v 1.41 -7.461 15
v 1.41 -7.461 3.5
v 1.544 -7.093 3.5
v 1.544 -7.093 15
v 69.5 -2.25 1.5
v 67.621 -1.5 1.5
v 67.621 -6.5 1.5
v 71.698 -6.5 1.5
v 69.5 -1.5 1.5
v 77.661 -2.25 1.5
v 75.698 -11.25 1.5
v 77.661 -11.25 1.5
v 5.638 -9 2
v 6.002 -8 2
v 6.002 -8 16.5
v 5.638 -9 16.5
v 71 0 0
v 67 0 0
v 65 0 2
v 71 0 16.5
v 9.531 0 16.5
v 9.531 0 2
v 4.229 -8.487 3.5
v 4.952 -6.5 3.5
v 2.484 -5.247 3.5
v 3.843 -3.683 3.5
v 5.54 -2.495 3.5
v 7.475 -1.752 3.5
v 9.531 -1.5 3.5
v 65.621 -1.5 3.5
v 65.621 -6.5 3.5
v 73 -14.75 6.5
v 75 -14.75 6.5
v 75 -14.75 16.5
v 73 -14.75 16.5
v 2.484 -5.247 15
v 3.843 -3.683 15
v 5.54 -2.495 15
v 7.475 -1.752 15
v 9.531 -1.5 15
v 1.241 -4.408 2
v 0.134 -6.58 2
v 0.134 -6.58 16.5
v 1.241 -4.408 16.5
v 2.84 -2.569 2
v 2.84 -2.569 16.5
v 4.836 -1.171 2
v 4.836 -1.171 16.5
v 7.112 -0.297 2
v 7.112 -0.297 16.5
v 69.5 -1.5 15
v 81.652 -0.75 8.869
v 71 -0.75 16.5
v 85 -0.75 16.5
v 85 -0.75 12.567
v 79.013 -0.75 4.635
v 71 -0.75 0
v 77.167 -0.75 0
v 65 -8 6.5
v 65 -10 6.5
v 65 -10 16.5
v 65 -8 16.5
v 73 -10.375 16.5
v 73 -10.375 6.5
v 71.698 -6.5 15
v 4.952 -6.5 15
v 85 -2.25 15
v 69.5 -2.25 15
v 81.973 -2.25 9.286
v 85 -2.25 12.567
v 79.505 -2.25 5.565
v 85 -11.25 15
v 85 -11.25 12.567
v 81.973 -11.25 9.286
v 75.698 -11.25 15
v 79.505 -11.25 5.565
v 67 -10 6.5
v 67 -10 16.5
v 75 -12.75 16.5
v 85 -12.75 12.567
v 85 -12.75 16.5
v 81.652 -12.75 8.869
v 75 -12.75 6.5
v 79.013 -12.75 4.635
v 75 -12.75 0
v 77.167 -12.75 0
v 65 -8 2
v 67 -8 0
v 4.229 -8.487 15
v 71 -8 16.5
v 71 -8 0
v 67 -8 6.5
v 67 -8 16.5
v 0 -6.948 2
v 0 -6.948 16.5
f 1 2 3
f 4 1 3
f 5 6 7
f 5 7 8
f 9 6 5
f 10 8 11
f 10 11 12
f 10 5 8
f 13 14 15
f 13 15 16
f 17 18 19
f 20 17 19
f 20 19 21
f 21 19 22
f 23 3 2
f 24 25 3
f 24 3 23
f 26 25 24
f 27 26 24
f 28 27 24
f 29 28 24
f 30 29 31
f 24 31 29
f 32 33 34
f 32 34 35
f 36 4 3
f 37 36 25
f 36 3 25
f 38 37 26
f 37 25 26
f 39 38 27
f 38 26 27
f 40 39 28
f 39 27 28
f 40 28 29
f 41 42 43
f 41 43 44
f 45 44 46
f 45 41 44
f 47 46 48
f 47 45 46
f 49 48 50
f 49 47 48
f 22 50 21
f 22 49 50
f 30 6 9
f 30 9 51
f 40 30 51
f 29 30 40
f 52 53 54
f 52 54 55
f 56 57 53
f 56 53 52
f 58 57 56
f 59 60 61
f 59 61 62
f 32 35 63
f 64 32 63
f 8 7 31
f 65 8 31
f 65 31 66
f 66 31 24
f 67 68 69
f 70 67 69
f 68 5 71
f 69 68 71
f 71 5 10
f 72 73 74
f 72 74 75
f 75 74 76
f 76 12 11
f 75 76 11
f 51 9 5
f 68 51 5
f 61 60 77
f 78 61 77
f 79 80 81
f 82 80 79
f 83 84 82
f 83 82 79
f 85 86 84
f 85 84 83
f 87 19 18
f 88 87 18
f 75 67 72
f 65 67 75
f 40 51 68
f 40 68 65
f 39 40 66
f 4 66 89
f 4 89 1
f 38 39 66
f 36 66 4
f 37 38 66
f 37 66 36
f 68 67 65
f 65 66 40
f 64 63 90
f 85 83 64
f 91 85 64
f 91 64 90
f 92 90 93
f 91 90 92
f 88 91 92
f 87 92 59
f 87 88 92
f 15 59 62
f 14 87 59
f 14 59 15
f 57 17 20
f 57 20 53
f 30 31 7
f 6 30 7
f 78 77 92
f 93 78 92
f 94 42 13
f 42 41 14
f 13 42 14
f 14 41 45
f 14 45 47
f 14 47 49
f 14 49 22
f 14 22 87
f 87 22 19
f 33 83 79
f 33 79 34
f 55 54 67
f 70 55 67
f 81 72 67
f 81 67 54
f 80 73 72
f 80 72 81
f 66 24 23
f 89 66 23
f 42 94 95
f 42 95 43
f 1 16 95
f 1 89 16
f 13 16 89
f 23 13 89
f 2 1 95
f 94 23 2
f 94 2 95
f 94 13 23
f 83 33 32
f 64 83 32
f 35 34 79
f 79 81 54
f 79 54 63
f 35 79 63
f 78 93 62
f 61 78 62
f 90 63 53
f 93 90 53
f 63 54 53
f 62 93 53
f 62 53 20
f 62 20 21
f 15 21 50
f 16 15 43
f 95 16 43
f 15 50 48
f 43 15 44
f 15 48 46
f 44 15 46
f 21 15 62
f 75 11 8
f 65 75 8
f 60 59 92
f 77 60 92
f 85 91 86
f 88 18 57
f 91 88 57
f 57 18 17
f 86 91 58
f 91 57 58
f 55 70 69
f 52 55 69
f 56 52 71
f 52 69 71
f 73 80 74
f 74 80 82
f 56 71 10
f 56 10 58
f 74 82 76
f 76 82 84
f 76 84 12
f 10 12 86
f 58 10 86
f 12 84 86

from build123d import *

# Parameters (mm, degrees)
RESSALTO_EXTRUS_O1_DEPTH = 16.5
CORTE_EXTRUS_O1_START    = -14.5
ESBO_O2_W                = 84.883298415
ESBO_O2_H                = 23.037156827
CORTE_EXTRUS_O1_DEPTH    = 14.5
CHANFRO1_SIZE            = 3
CASCA1_T                 = -1.5
CORTE_EXTRUS_O2_DEPTH    = 88.520354775
ESBO_O5_W                = 2
ESBO_O5_H                = 2
RESSALTO_EXTRUS_O2_DEPTH = 10


with BuildPart() as part:
    # Esboço1 → Ressalto-extrusão1 (new body)
    with BuildSketch(Plane.XY):
        with BuildLine():
            Line((9.53089658, 0), (71, 0))
            Line((71, 0), (71, -0.75))
            Line((71, -0.75), (85, -0.75))
            Line((85, -0.75), (85, -12.75))
            Line((85, -12.75), (75, -12.75))
            Line((75, -12.75), (71, -8))
            Line((71, -8), (6.002125959, -8))
            Line((6.002125959, -8), (5.638155725, -9))
            Line((5.638155725, -9), (0, -6.94787914))
            Line((0, -6.94787914), (0.133970372, -6.579798567))
            ThreePointArc((0.133970372, -6.579798567), (3.795132217, -1.808479557), (9.53089658, 0))
        make_face()
    extrude(amount=RESSALTO_EXTRUS_O1_DEPTH)

    # Esboço2 → Corte-extrusão1 (cut)
    with BuildSketch(Plane.XY.offset(16.5).offset(CORTE_EXTRUS_O1_START)):
        with Locations((25.558350793, -2.469824016)):
            Rectangle(ESBO_O2_W, ESBO_O2_H)
    extrude(amount=-CORTE_EXTRUS_O1_DEPTH, mode=Mode.SUBTRACT)

    # Chanfro1
    # the kernel refuses this chamfer: 3 mm, written as the material it adds along each edge
    with BuildSketch(Plane(origin=(68, 0, 2), x_dir=(-0.9996219169112968, 0, 0.027495876610586334), z_dir=(0, -1, 0))) as chanfro1_piece_1_section:
        Polygon((CHANFRO1_SIZE * 0.999621916911, CHANFRO1_SIZE * 0.0274958766106), (-CHANFRO1_SIZE * 0.0274958766106, CHANFRO1_SIZE * 0.999621916911), (0, 0), align=None)
    chanfro1_piece_1 = extrude(amount=8, mode=Mode.PRIVATE)
    chanfro1_piece_1 = split(chanfro1_piece_1, bisect_by=Plane(origin=(66.907908995, -4, 0), z_dir=(0, 0, 1)), keep=Keep.TOP, mode=Mode.PRIVATE)
    add(chanfro1_piece_1)

    # Casca1
    casca1_openings = [part.faces().sort_by_distance(p)[0] for p in [
        (85, -6.75, 8.25),
        (2.819077862, -7.97393957, 9.25),
    ]]
    offset(amount=CASCA1_T, openings=casca1_openings, kind=Kind.INTERSECTION)

    # Esboço4 → Corte-extrusão2 (cut, through all)
    with BuildSketch(Plane.XZ.offset(12.75)):
        with BuildLine():
            Line((77.16718427, 0), (85, 0))
            Line((85, 0), (85, 12.566963801))
            ThreePointArc((85, 12.566963801), (80.237763274, 6.810675399), (77.16718427, 0))
        make_face()
    extrude(amount=-CORTE_EXTRUS_O2_DEPTH, mode=Mode.SUBTRACT)

    # Esboço5 → Ressalto-extrusão2 (add)
    with BuildSketch(Plane.XY.offset(16.5)):
        with Locations((66, -9)):
            Rectangle(ESBO_O5_W, ESBO_O5_H)
        Polygon((75, -14.75), (73, -14.75), (73, -10.375), (75, -12.75), align=None)
    extrude(amount=-RESSALTO_EXTRUS_O2_DEPTH)


solid = part.part
